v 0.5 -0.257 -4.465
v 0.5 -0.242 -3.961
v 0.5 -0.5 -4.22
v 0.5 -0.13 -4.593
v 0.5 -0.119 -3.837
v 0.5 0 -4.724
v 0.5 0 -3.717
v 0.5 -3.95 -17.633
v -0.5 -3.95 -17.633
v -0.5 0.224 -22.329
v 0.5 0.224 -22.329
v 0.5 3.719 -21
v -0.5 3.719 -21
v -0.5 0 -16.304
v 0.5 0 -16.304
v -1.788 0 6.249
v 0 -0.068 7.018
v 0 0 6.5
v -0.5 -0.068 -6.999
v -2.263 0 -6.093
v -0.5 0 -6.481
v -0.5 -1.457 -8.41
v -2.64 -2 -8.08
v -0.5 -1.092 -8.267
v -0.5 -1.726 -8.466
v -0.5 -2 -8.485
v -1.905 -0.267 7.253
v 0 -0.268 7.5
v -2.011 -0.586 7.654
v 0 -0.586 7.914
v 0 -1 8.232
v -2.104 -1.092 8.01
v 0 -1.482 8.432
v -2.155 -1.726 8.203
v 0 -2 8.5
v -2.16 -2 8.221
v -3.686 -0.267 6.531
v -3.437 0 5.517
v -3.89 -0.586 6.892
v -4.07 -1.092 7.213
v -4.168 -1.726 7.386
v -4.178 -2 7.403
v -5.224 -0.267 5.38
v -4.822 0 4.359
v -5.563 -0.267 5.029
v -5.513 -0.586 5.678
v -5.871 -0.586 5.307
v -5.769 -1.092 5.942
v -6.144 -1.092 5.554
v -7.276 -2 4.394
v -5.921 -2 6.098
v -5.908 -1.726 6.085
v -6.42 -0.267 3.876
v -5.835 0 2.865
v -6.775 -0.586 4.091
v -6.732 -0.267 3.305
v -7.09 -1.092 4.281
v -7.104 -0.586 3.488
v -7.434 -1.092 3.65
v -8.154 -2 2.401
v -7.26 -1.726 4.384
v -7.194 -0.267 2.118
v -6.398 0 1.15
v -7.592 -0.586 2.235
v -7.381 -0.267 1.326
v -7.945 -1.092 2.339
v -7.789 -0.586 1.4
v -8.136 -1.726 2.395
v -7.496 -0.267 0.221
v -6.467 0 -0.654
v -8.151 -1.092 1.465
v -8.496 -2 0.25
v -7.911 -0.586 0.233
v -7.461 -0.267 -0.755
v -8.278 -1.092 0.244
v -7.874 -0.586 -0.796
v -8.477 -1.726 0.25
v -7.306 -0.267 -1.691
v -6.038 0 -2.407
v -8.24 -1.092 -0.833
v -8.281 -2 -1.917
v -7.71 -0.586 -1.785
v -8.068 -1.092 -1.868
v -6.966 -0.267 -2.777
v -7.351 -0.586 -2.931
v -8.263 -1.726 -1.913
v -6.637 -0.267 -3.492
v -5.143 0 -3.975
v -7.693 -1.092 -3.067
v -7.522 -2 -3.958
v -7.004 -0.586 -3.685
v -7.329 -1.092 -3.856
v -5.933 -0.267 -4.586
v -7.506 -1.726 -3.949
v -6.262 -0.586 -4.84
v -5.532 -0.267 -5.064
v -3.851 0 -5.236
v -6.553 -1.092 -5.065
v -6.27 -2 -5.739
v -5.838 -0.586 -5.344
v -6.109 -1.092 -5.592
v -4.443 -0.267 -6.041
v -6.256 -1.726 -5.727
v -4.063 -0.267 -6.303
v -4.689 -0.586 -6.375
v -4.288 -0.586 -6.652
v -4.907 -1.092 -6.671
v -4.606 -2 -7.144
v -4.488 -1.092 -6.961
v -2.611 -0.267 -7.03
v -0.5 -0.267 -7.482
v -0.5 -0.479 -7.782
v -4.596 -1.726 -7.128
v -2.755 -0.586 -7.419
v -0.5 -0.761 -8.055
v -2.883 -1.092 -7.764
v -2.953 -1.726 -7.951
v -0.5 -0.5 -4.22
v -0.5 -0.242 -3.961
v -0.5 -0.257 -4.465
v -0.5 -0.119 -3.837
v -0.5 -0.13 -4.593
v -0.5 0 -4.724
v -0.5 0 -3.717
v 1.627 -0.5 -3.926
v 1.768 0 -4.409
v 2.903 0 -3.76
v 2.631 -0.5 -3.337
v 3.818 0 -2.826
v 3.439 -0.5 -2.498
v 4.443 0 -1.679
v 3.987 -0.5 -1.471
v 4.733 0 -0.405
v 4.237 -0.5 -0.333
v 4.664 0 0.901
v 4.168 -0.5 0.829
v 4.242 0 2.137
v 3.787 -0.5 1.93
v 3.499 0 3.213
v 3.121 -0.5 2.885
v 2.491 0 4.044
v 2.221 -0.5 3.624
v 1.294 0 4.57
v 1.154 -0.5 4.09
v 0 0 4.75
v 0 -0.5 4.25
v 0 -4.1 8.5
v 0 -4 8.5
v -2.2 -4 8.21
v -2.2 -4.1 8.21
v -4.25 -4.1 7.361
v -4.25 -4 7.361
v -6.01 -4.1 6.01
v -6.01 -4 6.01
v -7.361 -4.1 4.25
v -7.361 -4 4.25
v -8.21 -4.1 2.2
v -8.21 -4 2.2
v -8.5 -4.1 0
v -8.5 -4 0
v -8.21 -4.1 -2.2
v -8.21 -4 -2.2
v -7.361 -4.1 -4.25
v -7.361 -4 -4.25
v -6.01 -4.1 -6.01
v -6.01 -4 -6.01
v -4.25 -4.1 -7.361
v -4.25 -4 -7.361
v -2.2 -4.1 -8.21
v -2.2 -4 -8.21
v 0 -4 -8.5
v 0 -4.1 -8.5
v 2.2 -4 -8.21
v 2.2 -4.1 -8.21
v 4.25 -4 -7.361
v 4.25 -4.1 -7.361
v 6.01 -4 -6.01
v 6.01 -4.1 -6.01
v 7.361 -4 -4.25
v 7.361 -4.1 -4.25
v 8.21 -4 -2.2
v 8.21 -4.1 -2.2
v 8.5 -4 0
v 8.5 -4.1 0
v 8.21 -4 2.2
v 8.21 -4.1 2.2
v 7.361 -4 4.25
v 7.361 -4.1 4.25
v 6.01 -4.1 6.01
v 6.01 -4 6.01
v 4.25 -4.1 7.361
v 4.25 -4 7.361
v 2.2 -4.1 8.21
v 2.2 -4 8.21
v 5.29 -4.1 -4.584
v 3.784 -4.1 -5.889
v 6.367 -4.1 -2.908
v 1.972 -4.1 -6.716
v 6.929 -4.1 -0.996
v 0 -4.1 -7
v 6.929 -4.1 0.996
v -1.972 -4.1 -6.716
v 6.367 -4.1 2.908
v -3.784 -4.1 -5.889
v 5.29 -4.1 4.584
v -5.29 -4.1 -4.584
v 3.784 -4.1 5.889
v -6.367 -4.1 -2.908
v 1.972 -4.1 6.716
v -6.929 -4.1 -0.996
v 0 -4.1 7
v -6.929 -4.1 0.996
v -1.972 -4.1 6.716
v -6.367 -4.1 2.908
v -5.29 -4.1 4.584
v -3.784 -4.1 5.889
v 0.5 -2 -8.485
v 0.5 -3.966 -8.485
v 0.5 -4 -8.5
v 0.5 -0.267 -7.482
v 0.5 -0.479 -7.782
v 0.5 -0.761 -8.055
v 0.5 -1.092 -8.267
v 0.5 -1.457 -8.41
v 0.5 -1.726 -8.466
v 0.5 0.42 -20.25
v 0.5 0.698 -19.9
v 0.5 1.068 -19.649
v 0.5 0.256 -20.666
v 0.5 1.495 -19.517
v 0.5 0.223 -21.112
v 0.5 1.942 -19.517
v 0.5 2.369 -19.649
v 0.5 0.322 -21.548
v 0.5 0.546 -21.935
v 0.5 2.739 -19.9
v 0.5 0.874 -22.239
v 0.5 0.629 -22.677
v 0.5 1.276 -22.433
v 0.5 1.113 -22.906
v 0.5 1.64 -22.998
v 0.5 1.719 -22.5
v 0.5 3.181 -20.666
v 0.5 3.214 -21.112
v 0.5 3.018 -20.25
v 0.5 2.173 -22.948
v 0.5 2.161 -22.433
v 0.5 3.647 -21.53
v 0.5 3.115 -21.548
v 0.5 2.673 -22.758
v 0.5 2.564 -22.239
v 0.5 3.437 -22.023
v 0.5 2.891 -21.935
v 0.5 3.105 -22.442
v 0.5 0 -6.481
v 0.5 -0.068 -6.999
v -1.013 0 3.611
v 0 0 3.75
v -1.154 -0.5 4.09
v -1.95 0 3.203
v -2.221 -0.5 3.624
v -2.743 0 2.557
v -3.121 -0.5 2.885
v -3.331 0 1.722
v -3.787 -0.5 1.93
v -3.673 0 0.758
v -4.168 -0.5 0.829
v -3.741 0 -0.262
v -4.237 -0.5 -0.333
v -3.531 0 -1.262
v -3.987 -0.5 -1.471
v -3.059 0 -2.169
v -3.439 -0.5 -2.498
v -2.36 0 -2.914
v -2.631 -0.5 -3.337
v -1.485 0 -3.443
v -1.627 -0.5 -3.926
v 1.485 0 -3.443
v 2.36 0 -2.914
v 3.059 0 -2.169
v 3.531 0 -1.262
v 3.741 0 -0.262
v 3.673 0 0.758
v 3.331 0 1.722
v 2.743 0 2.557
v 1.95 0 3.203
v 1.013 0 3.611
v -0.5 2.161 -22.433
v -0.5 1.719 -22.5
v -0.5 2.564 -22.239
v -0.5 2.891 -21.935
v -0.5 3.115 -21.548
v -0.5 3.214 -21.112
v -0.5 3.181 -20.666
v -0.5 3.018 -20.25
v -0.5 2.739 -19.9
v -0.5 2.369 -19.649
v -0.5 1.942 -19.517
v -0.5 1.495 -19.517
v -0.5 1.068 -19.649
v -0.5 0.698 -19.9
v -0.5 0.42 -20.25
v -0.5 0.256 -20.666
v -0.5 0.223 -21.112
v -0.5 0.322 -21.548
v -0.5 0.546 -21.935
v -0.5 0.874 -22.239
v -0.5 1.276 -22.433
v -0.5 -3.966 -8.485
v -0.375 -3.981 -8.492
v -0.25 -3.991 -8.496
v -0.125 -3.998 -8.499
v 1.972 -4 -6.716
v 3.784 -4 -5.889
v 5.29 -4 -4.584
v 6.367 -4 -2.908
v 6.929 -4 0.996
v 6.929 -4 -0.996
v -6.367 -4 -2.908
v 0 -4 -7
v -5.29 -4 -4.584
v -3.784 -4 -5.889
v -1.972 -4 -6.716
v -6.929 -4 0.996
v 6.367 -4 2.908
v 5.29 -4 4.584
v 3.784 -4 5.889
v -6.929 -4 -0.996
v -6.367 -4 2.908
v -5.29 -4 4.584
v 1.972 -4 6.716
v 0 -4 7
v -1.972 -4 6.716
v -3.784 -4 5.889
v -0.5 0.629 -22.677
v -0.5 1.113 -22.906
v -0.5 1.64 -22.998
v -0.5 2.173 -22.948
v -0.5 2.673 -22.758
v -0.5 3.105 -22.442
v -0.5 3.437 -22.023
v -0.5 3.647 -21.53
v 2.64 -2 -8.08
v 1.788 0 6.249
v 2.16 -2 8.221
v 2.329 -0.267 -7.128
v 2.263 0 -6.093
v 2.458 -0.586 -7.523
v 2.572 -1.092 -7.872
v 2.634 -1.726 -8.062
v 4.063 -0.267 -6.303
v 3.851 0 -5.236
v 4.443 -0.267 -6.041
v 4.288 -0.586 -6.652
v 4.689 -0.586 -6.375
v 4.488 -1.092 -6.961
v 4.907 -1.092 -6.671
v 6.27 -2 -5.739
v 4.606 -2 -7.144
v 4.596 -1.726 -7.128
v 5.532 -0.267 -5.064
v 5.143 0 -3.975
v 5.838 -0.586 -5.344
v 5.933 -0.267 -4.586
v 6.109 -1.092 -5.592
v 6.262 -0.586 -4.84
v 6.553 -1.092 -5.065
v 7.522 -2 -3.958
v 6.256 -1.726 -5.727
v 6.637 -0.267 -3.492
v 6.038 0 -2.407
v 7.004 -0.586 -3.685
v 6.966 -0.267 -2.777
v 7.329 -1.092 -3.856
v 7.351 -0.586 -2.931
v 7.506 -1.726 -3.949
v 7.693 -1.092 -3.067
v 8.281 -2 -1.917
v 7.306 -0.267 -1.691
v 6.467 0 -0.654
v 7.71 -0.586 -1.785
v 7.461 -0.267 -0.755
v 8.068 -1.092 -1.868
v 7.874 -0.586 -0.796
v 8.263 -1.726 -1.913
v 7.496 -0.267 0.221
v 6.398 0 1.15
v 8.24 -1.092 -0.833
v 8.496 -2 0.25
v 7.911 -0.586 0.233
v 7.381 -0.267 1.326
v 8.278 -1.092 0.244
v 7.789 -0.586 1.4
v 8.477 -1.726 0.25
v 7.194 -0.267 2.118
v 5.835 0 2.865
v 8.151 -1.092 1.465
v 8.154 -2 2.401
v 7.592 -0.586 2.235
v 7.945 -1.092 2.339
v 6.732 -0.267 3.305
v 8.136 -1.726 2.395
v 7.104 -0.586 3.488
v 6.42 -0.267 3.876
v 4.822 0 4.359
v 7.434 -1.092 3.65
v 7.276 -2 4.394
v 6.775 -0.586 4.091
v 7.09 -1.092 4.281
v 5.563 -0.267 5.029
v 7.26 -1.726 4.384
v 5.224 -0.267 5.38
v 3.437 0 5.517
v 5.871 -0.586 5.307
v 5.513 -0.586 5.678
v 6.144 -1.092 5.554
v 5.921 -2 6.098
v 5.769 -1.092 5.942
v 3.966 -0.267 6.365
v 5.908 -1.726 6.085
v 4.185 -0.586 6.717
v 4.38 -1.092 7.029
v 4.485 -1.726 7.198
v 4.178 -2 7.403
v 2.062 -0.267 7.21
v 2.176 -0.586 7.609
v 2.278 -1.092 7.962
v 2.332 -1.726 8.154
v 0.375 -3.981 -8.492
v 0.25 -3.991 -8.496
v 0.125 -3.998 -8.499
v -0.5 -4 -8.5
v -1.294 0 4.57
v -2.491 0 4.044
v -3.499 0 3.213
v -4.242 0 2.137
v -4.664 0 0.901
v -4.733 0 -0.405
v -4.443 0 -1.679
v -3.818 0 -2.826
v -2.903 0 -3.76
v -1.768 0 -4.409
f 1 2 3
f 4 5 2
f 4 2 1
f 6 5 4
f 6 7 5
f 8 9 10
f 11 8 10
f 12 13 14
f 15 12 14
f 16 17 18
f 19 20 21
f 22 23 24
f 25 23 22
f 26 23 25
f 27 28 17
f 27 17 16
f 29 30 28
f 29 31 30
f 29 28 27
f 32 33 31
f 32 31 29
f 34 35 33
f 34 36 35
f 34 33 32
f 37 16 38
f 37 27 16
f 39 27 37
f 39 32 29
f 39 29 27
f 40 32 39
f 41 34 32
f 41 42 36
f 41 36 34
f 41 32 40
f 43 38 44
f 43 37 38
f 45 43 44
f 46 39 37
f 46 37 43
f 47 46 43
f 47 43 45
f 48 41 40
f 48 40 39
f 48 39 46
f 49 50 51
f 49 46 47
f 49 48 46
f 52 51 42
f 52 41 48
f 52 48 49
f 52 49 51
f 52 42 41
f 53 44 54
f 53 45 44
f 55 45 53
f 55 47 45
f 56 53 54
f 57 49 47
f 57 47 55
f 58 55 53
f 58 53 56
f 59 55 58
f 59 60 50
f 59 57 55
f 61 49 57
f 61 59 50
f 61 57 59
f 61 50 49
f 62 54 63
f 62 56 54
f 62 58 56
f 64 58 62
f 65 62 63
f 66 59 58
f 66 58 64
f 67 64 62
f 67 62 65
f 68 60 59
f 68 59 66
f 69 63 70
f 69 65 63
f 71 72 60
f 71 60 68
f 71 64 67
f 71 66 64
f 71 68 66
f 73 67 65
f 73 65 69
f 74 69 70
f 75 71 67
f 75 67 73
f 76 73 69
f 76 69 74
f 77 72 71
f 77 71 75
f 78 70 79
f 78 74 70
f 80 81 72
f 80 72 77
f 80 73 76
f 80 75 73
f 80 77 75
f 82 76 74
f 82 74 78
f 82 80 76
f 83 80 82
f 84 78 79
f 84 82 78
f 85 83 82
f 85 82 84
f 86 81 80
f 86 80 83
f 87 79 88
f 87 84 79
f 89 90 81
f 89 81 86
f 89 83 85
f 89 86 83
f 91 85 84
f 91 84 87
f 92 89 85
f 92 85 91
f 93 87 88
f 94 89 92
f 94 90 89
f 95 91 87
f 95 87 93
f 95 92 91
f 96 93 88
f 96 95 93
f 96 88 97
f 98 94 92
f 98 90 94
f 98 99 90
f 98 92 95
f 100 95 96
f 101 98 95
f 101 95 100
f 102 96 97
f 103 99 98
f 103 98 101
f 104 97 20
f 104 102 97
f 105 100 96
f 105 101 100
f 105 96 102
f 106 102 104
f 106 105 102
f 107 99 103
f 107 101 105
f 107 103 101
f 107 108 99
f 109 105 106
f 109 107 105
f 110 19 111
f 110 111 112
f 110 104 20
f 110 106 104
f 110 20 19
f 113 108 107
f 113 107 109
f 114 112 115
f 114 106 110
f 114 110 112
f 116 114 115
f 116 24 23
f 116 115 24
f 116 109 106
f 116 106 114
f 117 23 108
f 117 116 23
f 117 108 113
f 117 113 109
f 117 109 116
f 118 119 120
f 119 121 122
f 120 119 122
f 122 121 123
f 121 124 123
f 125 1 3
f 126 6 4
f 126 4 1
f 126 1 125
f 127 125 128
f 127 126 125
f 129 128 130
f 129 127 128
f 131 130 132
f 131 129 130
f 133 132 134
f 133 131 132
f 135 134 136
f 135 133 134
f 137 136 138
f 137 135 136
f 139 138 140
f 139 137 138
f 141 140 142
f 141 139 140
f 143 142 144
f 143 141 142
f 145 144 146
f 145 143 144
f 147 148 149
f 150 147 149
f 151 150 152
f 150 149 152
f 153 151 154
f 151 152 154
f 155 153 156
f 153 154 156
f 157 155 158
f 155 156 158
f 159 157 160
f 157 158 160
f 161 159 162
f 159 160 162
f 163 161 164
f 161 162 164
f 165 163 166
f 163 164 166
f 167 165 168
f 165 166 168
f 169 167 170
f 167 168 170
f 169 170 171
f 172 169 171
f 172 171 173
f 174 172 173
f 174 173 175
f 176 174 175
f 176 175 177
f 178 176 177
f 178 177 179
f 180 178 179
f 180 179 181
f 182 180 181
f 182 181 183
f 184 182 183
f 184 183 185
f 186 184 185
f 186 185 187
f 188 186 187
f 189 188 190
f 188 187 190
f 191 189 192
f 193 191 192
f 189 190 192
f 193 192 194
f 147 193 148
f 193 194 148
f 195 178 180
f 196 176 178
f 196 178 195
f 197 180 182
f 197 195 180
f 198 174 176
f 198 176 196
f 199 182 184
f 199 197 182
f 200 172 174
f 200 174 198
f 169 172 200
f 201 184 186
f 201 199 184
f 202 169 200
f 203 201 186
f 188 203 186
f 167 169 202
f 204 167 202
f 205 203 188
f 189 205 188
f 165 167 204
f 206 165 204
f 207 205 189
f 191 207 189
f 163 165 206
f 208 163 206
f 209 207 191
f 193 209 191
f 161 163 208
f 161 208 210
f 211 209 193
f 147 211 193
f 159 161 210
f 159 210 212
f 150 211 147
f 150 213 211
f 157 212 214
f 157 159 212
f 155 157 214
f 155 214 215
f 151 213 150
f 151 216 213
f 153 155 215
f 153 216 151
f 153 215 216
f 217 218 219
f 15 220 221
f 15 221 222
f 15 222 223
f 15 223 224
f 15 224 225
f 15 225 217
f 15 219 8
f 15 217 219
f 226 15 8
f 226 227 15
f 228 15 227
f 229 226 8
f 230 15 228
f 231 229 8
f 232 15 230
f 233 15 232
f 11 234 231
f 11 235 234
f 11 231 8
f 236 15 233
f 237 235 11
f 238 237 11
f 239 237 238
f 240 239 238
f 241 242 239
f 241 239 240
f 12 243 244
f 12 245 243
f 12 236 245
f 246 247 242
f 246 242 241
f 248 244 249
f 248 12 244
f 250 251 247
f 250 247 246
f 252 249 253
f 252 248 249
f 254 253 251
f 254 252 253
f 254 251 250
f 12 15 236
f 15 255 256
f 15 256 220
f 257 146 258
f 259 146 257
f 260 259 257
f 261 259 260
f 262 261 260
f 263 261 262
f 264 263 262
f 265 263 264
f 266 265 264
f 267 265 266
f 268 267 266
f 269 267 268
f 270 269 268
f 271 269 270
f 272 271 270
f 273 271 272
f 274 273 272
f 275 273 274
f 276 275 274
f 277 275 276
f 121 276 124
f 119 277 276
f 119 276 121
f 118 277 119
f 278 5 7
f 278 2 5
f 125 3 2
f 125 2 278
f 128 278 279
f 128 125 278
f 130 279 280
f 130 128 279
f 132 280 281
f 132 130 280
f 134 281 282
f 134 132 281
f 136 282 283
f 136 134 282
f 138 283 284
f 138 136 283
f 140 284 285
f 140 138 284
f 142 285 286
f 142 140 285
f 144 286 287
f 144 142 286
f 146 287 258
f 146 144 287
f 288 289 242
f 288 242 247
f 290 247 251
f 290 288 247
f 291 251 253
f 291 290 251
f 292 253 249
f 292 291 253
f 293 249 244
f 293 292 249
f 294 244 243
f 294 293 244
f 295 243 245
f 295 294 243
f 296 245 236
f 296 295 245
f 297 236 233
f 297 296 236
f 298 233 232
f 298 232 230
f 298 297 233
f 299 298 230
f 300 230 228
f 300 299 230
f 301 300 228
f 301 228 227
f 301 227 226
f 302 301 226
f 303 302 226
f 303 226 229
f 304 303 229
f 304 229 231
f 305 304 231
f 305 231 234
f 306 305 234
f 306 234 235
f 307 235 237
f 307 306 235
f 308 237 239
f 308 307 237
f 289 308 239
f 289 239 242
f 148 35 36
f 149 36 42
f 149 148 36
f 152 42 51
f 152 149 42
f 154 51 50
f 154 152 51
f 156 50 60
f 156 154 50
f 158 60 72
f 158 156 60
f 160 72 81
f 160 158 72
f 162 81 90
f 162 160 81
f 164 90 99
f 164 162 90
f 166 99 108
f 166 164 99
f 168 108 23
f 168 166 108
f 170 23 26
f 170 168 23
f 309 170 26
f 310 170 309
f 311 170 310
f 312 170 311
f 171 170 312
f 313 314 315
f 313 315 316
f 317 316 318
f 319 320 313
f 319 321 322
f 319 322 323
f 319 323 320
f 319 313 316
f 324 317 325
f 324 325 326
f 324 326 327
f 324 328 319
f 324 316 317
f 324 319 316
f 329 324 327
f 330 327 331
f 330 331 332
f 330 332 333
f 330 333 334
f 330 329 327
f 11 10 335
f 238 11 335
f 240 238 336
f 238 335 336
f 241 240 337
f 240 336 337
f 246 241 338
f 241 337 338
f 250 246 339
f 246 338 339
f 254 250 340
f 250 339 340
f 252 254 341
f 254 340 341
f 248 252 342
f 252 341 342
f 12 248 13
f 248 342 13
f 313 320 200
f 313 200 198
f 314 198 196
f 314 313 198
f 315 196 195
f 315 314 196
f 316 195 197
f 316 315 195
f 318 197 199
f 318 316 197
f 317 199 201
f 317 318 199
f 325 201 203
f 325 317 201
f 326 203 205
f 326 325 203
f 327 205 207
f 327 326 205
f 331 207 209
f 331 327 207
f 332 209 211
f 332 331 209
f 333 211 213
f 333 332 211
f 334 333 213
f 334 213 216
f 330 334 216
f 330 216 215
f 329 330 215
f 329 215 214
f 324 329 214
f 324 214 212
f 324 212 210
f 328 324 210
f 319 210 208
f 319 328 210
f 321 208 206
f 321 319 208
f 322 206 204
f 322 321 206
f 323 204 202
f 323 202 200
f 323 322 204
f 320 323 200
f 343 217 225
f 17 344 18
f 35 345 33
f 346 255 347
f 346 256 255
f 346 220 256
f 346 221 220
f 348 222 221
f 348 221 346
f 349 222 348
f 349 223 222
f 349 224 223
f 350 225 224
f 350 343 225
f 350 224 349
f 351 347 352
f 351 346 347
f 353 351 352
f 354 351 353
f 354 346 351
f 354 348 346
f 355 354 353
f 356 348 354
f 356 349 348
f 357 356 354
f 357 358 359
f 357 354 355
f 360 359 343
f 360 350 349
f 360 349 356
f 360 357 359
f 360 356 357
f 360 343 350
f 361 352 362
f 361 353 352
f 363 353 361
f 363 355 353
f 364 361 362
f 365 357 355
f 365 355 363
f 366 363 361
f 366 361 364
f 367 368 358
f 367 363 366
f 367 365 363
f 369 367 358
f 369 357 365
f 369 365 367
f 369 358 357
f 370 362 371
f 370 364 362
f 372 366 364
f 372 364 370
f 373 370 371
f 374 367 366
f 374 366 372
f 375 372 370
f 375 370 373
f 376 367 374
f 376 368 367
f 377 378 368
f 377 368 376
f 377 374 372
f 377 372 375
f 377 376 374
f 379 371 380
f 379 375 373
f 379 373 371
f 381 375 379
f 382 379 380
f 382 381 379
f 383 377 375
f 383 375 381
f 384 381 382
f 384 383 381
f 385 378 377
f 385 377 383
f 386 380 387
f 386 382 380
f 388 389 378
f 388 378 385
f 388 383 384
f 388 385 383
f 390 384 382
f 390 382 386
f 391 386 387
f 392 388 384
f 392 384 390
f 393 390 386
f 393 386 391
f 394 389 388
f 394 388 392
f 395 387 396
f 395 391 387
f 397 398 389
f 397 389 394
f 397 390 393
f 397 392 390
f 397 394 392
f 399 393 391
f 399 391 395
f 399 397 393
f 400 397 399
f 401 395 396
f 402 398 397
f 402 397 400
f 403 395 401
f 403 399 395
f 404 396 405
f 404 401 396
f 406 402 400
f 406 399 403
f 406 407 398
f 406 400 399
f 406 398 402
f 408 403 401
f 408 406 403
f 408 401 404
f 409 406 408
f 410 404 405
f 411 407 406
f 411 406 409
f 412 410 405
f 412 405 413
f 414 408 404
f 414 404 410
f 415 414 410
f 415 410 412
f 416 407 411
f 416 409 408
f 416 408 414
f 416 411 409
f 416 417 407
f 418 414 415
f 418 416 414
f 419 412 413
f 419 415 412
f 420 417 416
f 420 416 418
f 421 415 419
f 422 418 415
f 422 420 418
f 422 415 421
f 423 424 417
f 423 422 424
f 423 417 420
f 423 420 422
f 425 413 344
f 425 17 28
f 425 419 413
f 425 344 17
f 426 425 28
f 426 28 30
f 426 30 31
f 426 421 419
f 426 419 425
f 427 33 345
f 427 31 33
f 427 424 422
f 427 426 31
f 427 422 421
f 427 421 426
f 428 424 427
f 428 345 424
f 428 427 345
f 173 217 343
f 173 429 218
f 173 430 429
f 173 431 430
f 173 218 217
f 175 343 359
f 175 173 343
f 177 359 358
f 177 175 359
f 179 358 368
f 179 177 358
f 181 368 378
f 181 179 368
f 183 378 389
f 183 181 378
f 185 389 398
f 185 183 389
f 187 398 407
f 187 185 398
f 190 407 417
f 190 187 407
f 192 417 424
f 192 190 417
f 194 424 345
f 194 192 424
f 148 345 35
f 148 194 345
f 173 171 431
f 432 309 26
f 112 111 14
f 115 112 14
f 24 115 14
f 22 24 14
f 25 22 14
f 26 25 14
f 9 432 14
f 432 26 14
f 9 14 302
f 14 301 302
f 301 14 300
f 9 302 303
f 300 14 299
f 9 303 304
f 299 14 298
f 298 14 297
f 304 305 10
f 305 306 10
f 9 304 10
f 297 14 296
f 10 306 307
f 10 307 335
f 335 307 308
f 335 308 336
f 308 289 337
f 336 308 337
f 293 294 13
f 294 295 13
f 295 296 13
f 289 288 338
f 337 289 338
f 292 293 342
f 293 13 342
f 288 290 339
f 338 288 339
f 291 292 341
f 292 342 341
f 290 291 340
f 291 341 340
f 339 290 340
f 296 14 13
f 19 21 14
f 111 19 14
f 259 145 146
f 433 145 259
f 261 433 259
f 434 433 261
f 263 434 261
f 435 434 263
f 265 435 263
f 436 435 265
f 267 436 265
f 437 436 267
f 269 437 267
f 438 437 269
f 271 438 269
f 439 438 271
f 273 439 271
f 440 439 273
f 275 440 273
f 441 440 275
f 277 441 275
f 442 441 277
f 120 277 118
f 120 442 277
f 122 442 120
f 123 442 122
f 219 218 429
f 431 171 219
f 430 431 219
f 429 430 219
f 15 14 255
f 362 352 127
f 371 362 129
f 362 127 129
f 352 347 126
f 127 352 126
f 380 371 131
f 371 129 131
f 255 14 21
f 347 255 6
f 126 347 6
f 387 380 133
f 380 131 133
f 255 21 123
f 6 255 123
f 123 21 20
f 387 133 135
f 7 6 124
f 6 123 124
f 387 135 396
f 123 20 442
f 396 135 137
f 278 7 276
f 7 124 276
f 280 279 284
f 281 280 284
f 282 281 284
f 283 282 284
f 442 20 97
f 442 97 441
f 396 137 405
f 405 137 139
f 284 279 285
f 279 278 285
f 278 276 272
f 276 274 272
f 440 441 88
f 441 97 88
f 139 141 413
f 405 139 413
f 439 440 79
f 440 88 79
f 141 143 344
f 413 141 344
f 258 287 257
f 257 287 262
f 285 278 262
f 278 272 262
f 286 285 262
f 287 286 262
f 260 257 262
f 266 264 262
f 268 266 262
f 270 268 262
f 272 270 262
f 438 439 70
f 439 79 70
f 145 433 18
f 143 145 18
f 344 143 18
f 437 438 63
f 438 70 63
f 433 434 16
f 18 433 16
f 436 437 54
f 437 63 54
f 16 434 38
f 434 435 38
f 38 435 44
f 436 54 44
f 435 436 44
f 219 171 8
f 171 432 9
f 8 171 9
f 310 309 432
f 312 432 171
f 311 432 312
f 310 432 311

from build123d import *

# Parameters (mm, degrees)
FILLET1_R                = 2
SKETCH5_R                = 8.5
SKETCH5_R_2              = 7
BOSS_EXTRUDE1_DEPTH      = 0.1
BOSS_EXTRUDE2_DEPTH      = 0.5
BOSS_EXTRUDE2_DEPTH_BACK = 0.5
SKETCH6_R                = 1.5


with BuildPart() as part:
    # Sketch4 → Revolve1 (revolve)
    with BuildSketch(Plane(origin=(0, 0, 0), x_dir=(0, 0, -1), z_dir=(1, 0, 0))):
        Polygon((0, 0), (-3.75, 0), (-4.25, -0.5), (-4.75, 0), (-8.5, 0), (-8.5, -4), (0, -4), align=None)
    revolve(axis=Axis((0, 1.890471386, 0), (0, -1, 0)))

    # Fillet1
    fillet1_edges = [part.edges().sort_by_distance(p)[0] for p in [
        (0, 0, -8.5),
    ]]
    fillet(fillet1_edges, radius=FILLET1_R)



with BuildPart() as body_2:
    # Sketch5 → Boss-Extrude1 (new body)
    with BuildSketch(Plane.XZ.offset(4)):
        Circle(SKETCH5_R)
        Circle(SKETCH5_R_2, mode=Mode.SUBTRACT)
    extrude(amount=BOSS_EXTRUDE1_DEPTH)


with BuildPart() as part_1:
    add(part.part)

    add(body_2.part)  # Boss-Extrude2 merges body 2
    # Sketch6 → Boss-Extrude2 (add, two sides: drawn at the far end of the back side and taken through both)
    with BuildSketch(Plane(origin=(0, 0, 0), x_dir=(0, 0, -1), z_dir=(1, 0, 0)).offset(-BOSS_EXTRUDE2_DEPTH_BACK)):
        with BuildLine():
            Line((16.303953204, 0), (0, 0))
            Line((0, 0), (0, -0.907670556))
            Line((0, -0.907670556), (7.174444166, -0.907670556))
            Line((7.174444166, -0.907670556), (8.5, -4))
            Line((8.5, -4), (17.632863069, -3.95))
            Line((17.632863069, -3.95), (22.328664529, 0.223690648))
            ThreePointArc((22.328664529, 0.223690648), (22.869458415, 2.429287044), (21, 3.718565415))
            Line((21, 3.718565415), (16.303953204, 0))
        make_face()
        with Locations((21, 1.718565415)):
            Circle(SKETCH6_R, mode=Mode.SUBTRACT)
    extrude(amount=BOSS_EXTRUDE2_DEPTH + BOSS_EXTRUDE2_DEPTH_BACK)


solid = part_1.part
